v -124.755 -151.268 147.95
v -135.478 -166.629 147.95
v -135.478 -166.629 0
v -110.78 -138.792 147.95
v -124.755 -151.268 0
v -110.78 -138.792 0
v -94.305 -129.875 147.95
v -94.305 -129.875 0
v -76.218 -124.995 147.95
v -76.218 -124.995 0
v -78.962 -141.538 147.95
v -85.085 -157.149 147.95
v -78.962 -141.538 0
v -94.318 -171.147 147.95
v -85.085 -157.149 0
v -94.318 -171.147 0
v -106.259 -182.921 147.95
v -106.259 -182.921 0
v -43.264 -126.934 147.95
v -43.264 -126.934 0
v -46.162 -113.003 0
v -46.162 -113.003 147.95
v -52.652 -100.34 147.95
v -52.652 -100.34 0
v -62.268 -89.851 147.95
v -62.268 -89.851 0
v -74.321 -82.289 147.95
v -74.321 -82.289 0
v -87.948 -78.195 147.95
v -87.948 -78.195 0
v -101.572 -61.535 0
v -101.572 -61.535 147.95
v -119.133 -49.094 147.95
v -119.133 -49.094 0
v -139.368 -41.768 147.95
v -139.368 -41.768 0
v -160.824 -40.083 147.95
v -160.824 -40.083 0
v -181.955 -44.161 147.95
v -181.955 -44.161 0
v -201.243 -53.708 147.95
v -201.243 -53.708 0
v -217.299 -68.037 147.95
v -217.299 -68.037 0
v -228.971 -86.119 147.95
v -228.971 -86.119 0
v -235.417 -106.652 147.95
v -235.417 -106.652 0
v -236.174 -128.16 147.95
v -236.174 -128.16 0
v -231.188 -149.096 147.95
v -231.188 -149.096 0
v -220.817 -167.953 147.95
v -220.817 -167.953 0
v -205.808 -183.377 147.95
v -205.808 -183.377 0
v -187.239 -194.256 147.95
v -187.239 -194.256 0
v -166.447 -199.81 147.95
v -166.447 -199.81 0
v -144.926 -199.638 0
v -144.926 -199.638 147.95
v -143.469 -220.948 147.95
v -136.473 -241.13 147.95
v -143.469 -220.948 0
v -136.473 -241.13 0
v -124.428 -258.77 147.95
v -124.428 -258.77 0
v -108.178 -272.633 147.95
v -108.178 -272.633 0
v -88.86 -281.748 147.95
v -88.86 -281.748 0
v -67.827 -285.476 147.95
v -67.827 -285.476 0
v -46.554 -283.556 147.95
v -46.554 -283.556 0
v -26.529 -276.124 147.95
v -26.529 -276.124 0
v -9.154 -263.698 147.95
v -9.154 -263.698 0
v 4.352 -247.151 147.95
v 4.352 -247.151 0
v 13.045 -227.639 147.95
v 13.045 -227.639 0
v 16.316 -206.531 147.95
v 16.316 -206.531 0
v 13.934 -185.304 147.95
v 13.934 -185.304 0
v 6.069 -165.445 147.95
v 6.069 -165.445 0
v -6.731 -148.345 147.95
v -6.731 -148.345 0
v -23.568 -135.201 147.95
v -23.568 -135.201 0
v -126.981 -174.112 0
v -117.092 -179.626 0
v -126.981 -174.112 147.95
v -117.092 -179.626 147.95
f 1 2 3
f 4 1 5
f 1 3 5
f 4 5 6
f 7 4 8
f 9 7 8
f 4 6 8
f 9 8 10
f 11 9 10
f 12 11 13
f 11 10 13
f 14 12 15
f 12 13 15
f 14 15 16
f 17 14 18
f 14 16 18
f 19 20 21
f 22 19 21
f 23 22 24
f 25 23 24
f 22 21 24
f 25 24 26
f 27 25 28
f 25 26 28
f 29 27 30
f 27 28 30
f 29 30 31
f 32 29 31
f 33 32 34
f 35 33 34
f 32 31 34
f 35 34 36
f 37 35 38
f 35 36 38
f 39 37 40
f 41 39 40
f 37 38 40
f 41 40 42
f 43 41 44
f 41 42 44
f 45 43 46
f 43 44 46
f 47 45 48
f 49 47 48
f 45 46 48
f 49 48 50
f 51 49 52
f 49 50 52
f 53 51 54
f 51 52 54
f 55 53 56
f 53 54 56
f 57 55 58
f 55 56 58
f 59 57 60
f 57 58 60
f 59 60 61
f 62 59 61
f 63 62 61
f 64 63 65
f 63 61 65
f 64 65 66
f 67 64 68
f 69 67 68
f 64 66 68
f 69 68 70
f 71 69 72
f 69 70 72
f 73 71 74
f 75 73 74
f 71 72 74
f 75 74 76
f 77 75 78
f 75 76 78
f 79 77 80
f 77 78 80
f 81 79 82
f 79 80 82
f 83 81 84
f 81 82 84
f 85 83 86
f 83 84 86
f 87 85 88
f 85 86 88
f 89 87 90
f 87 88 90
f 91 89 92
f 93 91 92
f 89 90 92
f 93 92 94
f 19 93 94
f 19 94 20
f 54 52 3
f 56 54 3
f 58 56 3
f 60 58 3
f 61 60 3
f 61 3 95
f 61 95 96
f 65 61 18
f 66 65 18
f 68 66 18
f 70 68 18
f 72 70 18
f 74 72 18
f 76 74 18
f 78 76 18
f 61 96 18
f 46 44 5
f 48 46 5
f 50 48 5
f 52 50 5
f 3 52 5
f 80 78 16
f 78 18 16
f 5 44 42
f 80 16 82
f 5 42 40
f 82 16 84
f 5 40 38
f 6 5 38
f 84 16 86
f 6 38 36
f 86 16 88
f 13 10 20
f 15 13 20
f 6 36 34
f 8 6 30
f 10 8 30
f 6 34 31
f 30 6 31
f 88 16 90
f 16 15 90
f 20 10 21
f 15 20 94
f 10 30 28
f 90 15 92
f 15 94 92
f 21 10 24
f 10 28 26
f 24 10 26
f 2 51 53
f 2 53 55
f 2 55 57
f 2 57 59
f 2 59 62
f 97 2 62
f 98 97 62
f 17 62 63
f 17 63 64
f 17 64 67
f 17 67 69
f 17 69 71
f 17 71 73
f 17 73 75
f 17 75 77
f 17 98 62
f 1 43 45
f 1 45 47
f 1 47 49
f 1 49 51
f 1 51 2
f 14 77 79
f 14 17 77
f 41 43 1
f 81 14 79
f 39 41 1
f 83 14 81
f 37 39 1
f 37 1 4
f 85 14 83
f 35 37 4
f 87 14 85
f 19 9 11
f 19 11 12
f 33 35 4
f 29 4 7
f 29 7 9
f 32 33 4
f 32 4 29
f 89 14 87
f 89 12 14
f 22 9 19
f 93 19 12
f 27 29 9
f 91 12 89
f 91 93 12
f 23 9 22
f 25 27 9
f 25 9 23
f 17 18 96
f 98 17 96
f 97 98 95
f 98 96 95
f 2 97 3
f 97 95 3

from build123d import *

# Parameters (mm, degrees)
F1_DEPTH = 147.9502767324


with BuildPart() as f1:
    # F0 (on Top) → F1 (new body)
    with BuildSketch(Plane.XY):
        with BuildLine():
            ThreePointArc((-87.9484422868, -78.1952069234), (-228.9705848103, -86.1188770419), (-144.926183088, -199.6378964581))
            ThreePointArc((-144.926183088, -199.6378964581), (-141.9776426647, -182.625293005), (-135.4781136343, -166.6290844149))
            ThreePointArc((-135.4781136343, -166.6290844149), (-143.1221520937, -105.5311323371), (-87.9484422868, -78.1952069234))
        make_face()
        with BuildLine():
            ThreePointArc((-43.1303394705, -130.6995274151), (-43.1637393197, -128.8153342329), (-43.2638969004, -126.9335085352))
            ThreePointArc((-43.2638969004, -126.9335085352), (-59.6405921047, -124.2616153411), (-76.2175991553, -124.9950976526))
            ThreePointArc((-76.2175991553, -124.9950976526), (-85.0850207305, -157.1491742454), (-106.2593539774, -182.9205424373))
            ThreePointArc((-106.2593539774, -182.9205424373), (-62.407597495, -171.6638621544), (-43.1303394705, -130.6995274151))
        make_face()
        with BuildLine():
            ThreePointArc((-135.4781136343, -166.6290844149), (-141.9776426647, -182.625293005), (-144.926183088, -199.6378964581))
            ThreePointArc((-144.926183088, -199.6378964581), (-124.4762204529, -193.8617677231), (-106.2593539774, -182.9205424373))
            ThreePointArc((-106.2593539774, -182.9205424373), (-122.1835688251, -177.1329724297), (-135.4781136343, -166.6290844149))
        make_face()
        with BuildLine():
            ThreePointArc((-76.2175991553, -124.9950976526), (-59.6405921047, -124.2616153411), (-43.2638969004, -126.9335085352))
            ThreePointArc((-43.2638969004, -126.9335085352), (-57.1072322193, -94.7723104014), (-87.9484422868, -78.1952069234))
            ThreePointArc((-87.9484422868, -78.1952069234), (-79.099972808, -98.3765624175), (-76.0744358047, -120.20380795))
            ThreePointArc((-76.0744358047, -120.20380795), (-76.1102346274, -122.6005219901), (-76.2175991553, -124.9950976526))
        make_face()
        with BuildLine():
            ThreePointArc((-135.4781136343, -166.6290844149), (-110.7796966213, -138.7922639194), (-76.2175991553, -124.9950976526))
            ThreePointArc((-76.2175991553, -124.9950976526), (-76.1102346274, -122.6005219901), (-76.0744358047, -120.20380795))
            ThreePointArc((-76.0744358047, -120.20380795), (-79.099972808, -98.3765624175), (-87.9484422868, -78.1952069234))
            ThreePointArc((-87.9484422868, -78.1952069234), (-143.1221520937, -105.5311323371), (-135.4781136343, -166.6290844149))
        make_face()
        with BuildLine():
            ThreePointArc((-144.926183088, -199.6378964581), (-66.9805164151, -285.5076041639), (16.3334276456, -204.835921526))
            ThreePointArc((16.3334276456, -204.835921526), (-0.2745731056, -155.7935239428), (-43.2638969004, -126.9335085352))
            ThreePointArc((-43.2638969004, -126.9335085352), (-43.1637393197, -128.8153342329), (-43.1303394705, -130.6995274151))
            ThreePointArc((-43.1303394705, -130.6995274151), (-62.407597495, -171.6638621544), (-106.2593539774, -182.9205424373))
            ThreePointArc((-106.2593539774, -182.9205424373), (-124.4762204529, -193.8617677231), (-144.926183088, -199.6378964581))
        make_face()
    extrude(amount=F1_DEPTH)


solid = f1.part
